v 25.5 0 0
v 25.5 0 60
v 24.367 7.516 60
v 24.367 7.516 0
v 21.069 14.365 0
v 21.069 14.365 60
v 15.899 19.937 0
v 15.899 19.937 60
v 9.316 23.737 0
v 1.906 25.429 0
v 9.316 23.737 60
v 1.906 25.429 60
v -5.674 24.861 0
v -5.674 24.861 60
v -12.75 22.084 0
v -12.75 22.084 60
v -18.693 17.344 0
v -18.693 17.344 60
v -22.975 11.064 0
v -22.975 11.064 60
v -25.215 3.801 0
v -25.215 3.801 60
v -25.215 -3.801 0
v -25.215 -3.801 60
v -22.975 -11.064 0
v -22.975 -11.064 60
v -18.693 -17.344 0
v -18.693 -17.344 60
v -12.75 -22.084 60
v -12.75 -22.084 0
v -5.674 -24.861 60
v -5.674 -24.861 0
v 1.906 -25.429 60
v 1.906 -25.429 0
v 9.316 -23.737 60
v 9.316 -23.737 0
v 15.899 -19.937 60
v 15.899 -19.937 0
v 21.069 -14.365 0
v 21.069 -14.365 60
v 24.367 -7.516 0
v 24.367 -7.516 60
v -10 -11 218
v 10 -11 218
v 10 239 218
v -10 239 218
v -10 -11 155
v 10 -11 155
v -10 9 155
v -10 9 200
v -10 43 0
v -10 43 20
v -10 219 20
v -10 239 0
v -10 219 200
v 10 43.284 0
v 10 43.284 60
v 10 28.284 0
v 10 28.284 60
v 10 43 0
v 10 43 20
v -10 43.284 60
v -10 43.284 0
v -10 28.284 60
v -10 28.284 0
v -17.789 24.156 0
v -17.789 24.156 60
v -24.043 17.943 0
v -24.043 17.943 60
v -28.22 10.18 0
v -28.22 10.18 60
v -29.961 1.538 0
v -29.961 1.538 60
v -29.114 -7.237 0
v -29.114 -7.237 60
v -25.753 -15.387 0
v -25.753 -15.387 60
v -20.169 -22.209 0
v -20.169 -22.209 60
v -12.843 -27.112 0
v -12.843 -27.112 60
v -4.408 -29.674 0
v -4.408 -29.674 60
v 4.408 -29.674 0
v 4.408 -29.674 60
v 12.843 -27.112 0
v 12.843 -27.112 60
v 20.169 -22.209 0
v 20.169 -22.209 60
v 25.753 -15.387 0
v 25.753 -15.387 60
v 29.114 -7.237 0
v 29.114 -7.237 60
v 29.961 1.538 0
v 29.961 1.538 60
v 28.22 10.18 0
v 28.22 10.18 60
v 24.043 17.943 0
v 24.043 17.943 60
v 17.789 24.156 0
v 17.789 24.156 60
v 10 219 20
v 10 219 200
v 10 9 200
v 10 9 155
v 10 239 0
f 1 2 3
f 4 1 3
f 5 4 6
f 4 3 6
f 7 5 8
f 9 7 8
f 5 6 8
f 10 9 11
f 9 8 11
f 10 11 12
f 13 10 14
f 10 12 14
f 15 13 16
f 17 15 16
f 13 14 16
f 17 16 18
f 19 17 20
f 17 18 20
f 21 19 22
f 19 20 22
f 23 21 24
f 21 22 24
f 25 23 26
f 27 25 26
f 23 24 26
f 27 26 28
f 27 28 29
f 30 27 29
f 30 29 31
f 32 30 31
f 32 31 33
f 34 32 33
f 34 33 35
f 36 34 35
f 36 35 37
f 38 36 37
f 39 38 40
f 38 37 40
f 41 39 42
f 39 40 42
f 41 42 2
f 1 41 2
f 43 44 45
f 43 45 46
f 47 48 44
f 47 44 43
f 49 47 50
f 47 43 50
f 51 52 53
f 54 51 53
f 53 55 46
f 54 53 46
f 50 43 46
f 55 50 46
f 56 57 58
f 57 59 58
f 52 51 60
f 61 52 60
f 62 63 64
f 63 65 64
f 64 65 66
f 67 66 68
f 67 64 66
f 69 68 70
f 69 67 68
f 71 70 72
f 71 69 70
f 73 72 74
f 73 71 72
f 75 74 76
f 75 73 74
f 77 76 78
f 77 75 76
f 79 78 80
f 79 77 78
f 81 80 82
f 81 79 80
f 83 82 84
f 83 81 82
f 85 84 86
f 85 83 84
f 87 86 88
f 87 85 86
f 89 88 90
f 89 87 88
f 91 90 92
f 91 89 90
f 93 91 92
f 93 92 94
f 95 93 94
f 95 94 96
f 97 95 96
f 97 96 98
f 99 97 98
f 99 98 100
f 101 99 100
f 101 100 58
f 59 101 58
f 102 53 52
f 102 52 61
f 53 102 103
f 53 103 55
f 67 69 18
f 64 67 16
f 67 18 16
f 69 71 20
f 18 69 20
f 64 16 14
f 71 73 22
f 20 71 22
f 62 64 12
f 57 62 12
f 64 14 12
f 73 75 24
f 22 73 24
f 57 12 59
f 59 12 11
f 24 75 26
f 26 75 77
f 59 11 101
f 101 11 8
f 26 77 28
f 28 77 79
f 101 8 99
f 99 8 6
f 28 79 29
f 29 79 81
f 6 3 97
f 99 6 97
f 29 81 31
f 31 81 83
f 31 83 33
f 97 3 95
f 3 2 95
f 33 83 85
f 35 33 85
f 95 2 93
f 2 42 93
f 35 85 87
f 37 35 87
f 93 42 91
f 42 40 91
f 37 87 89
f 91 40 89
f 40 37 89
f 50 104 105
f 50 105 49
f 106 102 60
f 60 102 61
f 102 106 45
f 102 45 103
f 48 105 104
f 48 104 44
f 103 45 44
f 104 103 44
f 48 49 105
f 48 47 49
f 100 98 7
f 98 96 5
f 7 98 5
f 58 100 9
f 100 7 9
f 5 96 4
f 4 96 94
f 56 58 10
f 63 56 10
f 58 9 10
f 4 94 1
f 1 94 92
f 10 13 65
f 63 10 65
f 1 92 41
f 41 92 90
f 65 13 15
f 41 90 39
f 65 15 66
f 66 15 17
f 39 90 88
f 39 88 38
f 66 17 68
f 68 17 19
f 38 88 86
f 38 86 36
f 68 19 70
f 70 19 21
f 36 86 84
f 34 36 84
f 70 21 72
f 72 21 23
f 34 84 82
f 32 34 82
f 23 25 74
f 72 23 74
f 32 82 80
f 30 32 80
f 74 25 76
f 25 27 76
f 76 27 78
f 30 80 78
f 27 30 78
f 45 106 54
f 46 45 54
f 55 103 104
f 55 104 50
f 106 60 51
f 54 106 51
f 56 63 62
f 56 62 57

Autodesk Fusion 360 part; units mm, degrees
cylinder "CylinderPrimitive1" add diameter 60 height 60 placed x (1, 0, 0) y (0, 1, 0) z (0, 0, 1) at (0, 0, 0) makes body 1
shell "Shell1" thickness 4.5 removed faces 1 at (7.6631, 11.2397, 60) on bodies 1
extrude "Extrude1" cut 1 faces at (5.0863, -5.2303, 4.5) along direction (0, 0, -1) blind 30 on bodies 1 bodies 1
ref_plane "WorkPlane1" through (0, 31, 0) normal (0, 1, 0) x (0, 0, 1)
sketch "Sketch2" plane through (0, 31, 0) normal (0, 1, 0) x (1, 0, 0)
  line L0 (10, 0) -> (-10, 0)
  line L1 (-10, 0) -> (-10, -60)
  line L2 (-10, -60) -> (10, -60)
  line L3 (10, -60) -> (10, 0)
extrude "Extrude2" add sketch "Sketch2" along normal blind 5 and the other way blind 5 bodies 1
extrude "Extrude3" add 1 faces at (-3.3333, 36, 20) along direction (0, 1, 0) blind 5.3 on bodies 1 bodies 1
extrude "Extrude4" add 1 faces at (-3.3333, 41.3, 20) along direction (0, 1, 0) blind 1.984 on bodies 1 bodies 1
sketch "Sketch3" plane through (0, 0, 0) normal (0, 1, 0) x (1, 0, 0)
ref_plane "WorkPlane2" through (0, 44, 0) normal (0, 1, 0) x (0, 0, 1)
sketch "Sketch4" plane through (0, 44, 0) normal (0, 1, 0) x (1, 0, 0)
  line L0 (10, 0) -> (-10, 0)
  line L1 (-10, 0) -> (-10, -20)
  line L2 (-10, -20) -> (10, -20)
  line L3 (10, -20) -> (10, 0)
  dimension "d17" = 20
extrude "Extrude1'" add sketch "Sketch4" along normal blind 55 and the other way blind 1 separate body makes body 2 in component "Component"
extrude "Extrude2'" add 1 faces at (-3.3333, 99, 6.6667) along direction (0, 1, 0) blind 150 on bodies 2 bodies 2 in component "Component"
extrude "Extrude3'" cut 1 faces at (-3.3333, 249, 6.6667) along direction (0, -1, 0) blind 50 on bodies 2 bodies 2 in component "Component"
extrude "Extrude4'" cut 1 faces at (-3.3333, 199, 6.6667) along direction (0, -1, 0) blind 10 on bodies 2 bodies 2 in component "Component"
extrude "Extrude5" add 1 faces at (-3.3333, 189, 6.6667) along direction (0, 1, 0) blind 50 on bodies 2 bodies 2 in component "Component"
sketch "Sketch5" plane through (0, 0, 20) normal (0, 0, 1) x (-1, 0, 0)
  line L0 (10, -239) -> (10, -43)
  line L1 (10, -43) -> (-10, -43)
  line L2 (-10, -43) -> (-10, -239)
  line L3 (-10, -239) -> (10, -239)
  line L4 (10, -239) -> (-10, -239)
  line L5 (-10, -239) -> (-10, -219)
  line L6 (-10, -219) -> (10, -219)
  line L7 (10, -219) -> (10, -239)
  dimension "d30" = 20
extrude "Extrude6" add sketch "Sketch5" along normal blind 200 contours L0 L2 L3 L4 L5 L6 L7 bodies 2 in component "Component"
extrude "Extrude7" cut 1 faces at (-3.3333, 232.3333, 220) along direction (0, 0, -1) blind 2 on bodies 2 bodies 2 in component "Component"
sketch "Sketch6" plane through (0, 219, 0) normal (0, -1, 0) x (1, 0, 0)
  line L0 (10, 218) -> (-10, 218)
  line L1 (-10, 218) -> (-10, 20)
  line L2 (-10, 20) -> (10, 20)
  line L3 (10, 20) -> (10, 218)
  line L4 (-10, 218) -> (10, 218)
  line L5 (10, 218) -> (10, 200)
  line L6 (10, 200) -> (-10, 200)
  line L7 (-10, 200) -> (-10, 218)
extrude "Extrude8" add sketch "Sketch6" along normal blind 220 contours L0 L1 L3 L4 L5 L6 L7 bodies 2 in component "Component"
extrude "Extrude9" add 1 faces at (3.3333, -1, 212) along direction (0, -1, 0) blind 10 on bodies 2 bodies 2 in component "Component"
sketch "Sketch7" plane through (0, 0, 200) normal (0, 0, -1) x (1, 0, 0)
  line L0 (-10, -219) -> (10, -219)
  line L1 (10, -219) -> (10, 11)
  line L2 (10, 11) -> (-10, 11)
  line L3 (-10, 11) -> (-10, -219)
  line L4 (-10, 11) -> (10, 11)
  line L5 (10, 11) -> (10, -9)
  line L6 (10, -9) -> (-10, -9)
  line L7 (-10, -9) -> (-10, 11)
  dimension "d39" = 20
extrude "Extrude10" add sketch "Sketch7" along normal blind 45 contours L1 L2 L3 L4 L5 L6 L7 bodies 2 in component "Component"
component "Component" placed x (1, 0, 0) y (0, 1, 0) z (0, 0, 1) at (0, 0, 0)
